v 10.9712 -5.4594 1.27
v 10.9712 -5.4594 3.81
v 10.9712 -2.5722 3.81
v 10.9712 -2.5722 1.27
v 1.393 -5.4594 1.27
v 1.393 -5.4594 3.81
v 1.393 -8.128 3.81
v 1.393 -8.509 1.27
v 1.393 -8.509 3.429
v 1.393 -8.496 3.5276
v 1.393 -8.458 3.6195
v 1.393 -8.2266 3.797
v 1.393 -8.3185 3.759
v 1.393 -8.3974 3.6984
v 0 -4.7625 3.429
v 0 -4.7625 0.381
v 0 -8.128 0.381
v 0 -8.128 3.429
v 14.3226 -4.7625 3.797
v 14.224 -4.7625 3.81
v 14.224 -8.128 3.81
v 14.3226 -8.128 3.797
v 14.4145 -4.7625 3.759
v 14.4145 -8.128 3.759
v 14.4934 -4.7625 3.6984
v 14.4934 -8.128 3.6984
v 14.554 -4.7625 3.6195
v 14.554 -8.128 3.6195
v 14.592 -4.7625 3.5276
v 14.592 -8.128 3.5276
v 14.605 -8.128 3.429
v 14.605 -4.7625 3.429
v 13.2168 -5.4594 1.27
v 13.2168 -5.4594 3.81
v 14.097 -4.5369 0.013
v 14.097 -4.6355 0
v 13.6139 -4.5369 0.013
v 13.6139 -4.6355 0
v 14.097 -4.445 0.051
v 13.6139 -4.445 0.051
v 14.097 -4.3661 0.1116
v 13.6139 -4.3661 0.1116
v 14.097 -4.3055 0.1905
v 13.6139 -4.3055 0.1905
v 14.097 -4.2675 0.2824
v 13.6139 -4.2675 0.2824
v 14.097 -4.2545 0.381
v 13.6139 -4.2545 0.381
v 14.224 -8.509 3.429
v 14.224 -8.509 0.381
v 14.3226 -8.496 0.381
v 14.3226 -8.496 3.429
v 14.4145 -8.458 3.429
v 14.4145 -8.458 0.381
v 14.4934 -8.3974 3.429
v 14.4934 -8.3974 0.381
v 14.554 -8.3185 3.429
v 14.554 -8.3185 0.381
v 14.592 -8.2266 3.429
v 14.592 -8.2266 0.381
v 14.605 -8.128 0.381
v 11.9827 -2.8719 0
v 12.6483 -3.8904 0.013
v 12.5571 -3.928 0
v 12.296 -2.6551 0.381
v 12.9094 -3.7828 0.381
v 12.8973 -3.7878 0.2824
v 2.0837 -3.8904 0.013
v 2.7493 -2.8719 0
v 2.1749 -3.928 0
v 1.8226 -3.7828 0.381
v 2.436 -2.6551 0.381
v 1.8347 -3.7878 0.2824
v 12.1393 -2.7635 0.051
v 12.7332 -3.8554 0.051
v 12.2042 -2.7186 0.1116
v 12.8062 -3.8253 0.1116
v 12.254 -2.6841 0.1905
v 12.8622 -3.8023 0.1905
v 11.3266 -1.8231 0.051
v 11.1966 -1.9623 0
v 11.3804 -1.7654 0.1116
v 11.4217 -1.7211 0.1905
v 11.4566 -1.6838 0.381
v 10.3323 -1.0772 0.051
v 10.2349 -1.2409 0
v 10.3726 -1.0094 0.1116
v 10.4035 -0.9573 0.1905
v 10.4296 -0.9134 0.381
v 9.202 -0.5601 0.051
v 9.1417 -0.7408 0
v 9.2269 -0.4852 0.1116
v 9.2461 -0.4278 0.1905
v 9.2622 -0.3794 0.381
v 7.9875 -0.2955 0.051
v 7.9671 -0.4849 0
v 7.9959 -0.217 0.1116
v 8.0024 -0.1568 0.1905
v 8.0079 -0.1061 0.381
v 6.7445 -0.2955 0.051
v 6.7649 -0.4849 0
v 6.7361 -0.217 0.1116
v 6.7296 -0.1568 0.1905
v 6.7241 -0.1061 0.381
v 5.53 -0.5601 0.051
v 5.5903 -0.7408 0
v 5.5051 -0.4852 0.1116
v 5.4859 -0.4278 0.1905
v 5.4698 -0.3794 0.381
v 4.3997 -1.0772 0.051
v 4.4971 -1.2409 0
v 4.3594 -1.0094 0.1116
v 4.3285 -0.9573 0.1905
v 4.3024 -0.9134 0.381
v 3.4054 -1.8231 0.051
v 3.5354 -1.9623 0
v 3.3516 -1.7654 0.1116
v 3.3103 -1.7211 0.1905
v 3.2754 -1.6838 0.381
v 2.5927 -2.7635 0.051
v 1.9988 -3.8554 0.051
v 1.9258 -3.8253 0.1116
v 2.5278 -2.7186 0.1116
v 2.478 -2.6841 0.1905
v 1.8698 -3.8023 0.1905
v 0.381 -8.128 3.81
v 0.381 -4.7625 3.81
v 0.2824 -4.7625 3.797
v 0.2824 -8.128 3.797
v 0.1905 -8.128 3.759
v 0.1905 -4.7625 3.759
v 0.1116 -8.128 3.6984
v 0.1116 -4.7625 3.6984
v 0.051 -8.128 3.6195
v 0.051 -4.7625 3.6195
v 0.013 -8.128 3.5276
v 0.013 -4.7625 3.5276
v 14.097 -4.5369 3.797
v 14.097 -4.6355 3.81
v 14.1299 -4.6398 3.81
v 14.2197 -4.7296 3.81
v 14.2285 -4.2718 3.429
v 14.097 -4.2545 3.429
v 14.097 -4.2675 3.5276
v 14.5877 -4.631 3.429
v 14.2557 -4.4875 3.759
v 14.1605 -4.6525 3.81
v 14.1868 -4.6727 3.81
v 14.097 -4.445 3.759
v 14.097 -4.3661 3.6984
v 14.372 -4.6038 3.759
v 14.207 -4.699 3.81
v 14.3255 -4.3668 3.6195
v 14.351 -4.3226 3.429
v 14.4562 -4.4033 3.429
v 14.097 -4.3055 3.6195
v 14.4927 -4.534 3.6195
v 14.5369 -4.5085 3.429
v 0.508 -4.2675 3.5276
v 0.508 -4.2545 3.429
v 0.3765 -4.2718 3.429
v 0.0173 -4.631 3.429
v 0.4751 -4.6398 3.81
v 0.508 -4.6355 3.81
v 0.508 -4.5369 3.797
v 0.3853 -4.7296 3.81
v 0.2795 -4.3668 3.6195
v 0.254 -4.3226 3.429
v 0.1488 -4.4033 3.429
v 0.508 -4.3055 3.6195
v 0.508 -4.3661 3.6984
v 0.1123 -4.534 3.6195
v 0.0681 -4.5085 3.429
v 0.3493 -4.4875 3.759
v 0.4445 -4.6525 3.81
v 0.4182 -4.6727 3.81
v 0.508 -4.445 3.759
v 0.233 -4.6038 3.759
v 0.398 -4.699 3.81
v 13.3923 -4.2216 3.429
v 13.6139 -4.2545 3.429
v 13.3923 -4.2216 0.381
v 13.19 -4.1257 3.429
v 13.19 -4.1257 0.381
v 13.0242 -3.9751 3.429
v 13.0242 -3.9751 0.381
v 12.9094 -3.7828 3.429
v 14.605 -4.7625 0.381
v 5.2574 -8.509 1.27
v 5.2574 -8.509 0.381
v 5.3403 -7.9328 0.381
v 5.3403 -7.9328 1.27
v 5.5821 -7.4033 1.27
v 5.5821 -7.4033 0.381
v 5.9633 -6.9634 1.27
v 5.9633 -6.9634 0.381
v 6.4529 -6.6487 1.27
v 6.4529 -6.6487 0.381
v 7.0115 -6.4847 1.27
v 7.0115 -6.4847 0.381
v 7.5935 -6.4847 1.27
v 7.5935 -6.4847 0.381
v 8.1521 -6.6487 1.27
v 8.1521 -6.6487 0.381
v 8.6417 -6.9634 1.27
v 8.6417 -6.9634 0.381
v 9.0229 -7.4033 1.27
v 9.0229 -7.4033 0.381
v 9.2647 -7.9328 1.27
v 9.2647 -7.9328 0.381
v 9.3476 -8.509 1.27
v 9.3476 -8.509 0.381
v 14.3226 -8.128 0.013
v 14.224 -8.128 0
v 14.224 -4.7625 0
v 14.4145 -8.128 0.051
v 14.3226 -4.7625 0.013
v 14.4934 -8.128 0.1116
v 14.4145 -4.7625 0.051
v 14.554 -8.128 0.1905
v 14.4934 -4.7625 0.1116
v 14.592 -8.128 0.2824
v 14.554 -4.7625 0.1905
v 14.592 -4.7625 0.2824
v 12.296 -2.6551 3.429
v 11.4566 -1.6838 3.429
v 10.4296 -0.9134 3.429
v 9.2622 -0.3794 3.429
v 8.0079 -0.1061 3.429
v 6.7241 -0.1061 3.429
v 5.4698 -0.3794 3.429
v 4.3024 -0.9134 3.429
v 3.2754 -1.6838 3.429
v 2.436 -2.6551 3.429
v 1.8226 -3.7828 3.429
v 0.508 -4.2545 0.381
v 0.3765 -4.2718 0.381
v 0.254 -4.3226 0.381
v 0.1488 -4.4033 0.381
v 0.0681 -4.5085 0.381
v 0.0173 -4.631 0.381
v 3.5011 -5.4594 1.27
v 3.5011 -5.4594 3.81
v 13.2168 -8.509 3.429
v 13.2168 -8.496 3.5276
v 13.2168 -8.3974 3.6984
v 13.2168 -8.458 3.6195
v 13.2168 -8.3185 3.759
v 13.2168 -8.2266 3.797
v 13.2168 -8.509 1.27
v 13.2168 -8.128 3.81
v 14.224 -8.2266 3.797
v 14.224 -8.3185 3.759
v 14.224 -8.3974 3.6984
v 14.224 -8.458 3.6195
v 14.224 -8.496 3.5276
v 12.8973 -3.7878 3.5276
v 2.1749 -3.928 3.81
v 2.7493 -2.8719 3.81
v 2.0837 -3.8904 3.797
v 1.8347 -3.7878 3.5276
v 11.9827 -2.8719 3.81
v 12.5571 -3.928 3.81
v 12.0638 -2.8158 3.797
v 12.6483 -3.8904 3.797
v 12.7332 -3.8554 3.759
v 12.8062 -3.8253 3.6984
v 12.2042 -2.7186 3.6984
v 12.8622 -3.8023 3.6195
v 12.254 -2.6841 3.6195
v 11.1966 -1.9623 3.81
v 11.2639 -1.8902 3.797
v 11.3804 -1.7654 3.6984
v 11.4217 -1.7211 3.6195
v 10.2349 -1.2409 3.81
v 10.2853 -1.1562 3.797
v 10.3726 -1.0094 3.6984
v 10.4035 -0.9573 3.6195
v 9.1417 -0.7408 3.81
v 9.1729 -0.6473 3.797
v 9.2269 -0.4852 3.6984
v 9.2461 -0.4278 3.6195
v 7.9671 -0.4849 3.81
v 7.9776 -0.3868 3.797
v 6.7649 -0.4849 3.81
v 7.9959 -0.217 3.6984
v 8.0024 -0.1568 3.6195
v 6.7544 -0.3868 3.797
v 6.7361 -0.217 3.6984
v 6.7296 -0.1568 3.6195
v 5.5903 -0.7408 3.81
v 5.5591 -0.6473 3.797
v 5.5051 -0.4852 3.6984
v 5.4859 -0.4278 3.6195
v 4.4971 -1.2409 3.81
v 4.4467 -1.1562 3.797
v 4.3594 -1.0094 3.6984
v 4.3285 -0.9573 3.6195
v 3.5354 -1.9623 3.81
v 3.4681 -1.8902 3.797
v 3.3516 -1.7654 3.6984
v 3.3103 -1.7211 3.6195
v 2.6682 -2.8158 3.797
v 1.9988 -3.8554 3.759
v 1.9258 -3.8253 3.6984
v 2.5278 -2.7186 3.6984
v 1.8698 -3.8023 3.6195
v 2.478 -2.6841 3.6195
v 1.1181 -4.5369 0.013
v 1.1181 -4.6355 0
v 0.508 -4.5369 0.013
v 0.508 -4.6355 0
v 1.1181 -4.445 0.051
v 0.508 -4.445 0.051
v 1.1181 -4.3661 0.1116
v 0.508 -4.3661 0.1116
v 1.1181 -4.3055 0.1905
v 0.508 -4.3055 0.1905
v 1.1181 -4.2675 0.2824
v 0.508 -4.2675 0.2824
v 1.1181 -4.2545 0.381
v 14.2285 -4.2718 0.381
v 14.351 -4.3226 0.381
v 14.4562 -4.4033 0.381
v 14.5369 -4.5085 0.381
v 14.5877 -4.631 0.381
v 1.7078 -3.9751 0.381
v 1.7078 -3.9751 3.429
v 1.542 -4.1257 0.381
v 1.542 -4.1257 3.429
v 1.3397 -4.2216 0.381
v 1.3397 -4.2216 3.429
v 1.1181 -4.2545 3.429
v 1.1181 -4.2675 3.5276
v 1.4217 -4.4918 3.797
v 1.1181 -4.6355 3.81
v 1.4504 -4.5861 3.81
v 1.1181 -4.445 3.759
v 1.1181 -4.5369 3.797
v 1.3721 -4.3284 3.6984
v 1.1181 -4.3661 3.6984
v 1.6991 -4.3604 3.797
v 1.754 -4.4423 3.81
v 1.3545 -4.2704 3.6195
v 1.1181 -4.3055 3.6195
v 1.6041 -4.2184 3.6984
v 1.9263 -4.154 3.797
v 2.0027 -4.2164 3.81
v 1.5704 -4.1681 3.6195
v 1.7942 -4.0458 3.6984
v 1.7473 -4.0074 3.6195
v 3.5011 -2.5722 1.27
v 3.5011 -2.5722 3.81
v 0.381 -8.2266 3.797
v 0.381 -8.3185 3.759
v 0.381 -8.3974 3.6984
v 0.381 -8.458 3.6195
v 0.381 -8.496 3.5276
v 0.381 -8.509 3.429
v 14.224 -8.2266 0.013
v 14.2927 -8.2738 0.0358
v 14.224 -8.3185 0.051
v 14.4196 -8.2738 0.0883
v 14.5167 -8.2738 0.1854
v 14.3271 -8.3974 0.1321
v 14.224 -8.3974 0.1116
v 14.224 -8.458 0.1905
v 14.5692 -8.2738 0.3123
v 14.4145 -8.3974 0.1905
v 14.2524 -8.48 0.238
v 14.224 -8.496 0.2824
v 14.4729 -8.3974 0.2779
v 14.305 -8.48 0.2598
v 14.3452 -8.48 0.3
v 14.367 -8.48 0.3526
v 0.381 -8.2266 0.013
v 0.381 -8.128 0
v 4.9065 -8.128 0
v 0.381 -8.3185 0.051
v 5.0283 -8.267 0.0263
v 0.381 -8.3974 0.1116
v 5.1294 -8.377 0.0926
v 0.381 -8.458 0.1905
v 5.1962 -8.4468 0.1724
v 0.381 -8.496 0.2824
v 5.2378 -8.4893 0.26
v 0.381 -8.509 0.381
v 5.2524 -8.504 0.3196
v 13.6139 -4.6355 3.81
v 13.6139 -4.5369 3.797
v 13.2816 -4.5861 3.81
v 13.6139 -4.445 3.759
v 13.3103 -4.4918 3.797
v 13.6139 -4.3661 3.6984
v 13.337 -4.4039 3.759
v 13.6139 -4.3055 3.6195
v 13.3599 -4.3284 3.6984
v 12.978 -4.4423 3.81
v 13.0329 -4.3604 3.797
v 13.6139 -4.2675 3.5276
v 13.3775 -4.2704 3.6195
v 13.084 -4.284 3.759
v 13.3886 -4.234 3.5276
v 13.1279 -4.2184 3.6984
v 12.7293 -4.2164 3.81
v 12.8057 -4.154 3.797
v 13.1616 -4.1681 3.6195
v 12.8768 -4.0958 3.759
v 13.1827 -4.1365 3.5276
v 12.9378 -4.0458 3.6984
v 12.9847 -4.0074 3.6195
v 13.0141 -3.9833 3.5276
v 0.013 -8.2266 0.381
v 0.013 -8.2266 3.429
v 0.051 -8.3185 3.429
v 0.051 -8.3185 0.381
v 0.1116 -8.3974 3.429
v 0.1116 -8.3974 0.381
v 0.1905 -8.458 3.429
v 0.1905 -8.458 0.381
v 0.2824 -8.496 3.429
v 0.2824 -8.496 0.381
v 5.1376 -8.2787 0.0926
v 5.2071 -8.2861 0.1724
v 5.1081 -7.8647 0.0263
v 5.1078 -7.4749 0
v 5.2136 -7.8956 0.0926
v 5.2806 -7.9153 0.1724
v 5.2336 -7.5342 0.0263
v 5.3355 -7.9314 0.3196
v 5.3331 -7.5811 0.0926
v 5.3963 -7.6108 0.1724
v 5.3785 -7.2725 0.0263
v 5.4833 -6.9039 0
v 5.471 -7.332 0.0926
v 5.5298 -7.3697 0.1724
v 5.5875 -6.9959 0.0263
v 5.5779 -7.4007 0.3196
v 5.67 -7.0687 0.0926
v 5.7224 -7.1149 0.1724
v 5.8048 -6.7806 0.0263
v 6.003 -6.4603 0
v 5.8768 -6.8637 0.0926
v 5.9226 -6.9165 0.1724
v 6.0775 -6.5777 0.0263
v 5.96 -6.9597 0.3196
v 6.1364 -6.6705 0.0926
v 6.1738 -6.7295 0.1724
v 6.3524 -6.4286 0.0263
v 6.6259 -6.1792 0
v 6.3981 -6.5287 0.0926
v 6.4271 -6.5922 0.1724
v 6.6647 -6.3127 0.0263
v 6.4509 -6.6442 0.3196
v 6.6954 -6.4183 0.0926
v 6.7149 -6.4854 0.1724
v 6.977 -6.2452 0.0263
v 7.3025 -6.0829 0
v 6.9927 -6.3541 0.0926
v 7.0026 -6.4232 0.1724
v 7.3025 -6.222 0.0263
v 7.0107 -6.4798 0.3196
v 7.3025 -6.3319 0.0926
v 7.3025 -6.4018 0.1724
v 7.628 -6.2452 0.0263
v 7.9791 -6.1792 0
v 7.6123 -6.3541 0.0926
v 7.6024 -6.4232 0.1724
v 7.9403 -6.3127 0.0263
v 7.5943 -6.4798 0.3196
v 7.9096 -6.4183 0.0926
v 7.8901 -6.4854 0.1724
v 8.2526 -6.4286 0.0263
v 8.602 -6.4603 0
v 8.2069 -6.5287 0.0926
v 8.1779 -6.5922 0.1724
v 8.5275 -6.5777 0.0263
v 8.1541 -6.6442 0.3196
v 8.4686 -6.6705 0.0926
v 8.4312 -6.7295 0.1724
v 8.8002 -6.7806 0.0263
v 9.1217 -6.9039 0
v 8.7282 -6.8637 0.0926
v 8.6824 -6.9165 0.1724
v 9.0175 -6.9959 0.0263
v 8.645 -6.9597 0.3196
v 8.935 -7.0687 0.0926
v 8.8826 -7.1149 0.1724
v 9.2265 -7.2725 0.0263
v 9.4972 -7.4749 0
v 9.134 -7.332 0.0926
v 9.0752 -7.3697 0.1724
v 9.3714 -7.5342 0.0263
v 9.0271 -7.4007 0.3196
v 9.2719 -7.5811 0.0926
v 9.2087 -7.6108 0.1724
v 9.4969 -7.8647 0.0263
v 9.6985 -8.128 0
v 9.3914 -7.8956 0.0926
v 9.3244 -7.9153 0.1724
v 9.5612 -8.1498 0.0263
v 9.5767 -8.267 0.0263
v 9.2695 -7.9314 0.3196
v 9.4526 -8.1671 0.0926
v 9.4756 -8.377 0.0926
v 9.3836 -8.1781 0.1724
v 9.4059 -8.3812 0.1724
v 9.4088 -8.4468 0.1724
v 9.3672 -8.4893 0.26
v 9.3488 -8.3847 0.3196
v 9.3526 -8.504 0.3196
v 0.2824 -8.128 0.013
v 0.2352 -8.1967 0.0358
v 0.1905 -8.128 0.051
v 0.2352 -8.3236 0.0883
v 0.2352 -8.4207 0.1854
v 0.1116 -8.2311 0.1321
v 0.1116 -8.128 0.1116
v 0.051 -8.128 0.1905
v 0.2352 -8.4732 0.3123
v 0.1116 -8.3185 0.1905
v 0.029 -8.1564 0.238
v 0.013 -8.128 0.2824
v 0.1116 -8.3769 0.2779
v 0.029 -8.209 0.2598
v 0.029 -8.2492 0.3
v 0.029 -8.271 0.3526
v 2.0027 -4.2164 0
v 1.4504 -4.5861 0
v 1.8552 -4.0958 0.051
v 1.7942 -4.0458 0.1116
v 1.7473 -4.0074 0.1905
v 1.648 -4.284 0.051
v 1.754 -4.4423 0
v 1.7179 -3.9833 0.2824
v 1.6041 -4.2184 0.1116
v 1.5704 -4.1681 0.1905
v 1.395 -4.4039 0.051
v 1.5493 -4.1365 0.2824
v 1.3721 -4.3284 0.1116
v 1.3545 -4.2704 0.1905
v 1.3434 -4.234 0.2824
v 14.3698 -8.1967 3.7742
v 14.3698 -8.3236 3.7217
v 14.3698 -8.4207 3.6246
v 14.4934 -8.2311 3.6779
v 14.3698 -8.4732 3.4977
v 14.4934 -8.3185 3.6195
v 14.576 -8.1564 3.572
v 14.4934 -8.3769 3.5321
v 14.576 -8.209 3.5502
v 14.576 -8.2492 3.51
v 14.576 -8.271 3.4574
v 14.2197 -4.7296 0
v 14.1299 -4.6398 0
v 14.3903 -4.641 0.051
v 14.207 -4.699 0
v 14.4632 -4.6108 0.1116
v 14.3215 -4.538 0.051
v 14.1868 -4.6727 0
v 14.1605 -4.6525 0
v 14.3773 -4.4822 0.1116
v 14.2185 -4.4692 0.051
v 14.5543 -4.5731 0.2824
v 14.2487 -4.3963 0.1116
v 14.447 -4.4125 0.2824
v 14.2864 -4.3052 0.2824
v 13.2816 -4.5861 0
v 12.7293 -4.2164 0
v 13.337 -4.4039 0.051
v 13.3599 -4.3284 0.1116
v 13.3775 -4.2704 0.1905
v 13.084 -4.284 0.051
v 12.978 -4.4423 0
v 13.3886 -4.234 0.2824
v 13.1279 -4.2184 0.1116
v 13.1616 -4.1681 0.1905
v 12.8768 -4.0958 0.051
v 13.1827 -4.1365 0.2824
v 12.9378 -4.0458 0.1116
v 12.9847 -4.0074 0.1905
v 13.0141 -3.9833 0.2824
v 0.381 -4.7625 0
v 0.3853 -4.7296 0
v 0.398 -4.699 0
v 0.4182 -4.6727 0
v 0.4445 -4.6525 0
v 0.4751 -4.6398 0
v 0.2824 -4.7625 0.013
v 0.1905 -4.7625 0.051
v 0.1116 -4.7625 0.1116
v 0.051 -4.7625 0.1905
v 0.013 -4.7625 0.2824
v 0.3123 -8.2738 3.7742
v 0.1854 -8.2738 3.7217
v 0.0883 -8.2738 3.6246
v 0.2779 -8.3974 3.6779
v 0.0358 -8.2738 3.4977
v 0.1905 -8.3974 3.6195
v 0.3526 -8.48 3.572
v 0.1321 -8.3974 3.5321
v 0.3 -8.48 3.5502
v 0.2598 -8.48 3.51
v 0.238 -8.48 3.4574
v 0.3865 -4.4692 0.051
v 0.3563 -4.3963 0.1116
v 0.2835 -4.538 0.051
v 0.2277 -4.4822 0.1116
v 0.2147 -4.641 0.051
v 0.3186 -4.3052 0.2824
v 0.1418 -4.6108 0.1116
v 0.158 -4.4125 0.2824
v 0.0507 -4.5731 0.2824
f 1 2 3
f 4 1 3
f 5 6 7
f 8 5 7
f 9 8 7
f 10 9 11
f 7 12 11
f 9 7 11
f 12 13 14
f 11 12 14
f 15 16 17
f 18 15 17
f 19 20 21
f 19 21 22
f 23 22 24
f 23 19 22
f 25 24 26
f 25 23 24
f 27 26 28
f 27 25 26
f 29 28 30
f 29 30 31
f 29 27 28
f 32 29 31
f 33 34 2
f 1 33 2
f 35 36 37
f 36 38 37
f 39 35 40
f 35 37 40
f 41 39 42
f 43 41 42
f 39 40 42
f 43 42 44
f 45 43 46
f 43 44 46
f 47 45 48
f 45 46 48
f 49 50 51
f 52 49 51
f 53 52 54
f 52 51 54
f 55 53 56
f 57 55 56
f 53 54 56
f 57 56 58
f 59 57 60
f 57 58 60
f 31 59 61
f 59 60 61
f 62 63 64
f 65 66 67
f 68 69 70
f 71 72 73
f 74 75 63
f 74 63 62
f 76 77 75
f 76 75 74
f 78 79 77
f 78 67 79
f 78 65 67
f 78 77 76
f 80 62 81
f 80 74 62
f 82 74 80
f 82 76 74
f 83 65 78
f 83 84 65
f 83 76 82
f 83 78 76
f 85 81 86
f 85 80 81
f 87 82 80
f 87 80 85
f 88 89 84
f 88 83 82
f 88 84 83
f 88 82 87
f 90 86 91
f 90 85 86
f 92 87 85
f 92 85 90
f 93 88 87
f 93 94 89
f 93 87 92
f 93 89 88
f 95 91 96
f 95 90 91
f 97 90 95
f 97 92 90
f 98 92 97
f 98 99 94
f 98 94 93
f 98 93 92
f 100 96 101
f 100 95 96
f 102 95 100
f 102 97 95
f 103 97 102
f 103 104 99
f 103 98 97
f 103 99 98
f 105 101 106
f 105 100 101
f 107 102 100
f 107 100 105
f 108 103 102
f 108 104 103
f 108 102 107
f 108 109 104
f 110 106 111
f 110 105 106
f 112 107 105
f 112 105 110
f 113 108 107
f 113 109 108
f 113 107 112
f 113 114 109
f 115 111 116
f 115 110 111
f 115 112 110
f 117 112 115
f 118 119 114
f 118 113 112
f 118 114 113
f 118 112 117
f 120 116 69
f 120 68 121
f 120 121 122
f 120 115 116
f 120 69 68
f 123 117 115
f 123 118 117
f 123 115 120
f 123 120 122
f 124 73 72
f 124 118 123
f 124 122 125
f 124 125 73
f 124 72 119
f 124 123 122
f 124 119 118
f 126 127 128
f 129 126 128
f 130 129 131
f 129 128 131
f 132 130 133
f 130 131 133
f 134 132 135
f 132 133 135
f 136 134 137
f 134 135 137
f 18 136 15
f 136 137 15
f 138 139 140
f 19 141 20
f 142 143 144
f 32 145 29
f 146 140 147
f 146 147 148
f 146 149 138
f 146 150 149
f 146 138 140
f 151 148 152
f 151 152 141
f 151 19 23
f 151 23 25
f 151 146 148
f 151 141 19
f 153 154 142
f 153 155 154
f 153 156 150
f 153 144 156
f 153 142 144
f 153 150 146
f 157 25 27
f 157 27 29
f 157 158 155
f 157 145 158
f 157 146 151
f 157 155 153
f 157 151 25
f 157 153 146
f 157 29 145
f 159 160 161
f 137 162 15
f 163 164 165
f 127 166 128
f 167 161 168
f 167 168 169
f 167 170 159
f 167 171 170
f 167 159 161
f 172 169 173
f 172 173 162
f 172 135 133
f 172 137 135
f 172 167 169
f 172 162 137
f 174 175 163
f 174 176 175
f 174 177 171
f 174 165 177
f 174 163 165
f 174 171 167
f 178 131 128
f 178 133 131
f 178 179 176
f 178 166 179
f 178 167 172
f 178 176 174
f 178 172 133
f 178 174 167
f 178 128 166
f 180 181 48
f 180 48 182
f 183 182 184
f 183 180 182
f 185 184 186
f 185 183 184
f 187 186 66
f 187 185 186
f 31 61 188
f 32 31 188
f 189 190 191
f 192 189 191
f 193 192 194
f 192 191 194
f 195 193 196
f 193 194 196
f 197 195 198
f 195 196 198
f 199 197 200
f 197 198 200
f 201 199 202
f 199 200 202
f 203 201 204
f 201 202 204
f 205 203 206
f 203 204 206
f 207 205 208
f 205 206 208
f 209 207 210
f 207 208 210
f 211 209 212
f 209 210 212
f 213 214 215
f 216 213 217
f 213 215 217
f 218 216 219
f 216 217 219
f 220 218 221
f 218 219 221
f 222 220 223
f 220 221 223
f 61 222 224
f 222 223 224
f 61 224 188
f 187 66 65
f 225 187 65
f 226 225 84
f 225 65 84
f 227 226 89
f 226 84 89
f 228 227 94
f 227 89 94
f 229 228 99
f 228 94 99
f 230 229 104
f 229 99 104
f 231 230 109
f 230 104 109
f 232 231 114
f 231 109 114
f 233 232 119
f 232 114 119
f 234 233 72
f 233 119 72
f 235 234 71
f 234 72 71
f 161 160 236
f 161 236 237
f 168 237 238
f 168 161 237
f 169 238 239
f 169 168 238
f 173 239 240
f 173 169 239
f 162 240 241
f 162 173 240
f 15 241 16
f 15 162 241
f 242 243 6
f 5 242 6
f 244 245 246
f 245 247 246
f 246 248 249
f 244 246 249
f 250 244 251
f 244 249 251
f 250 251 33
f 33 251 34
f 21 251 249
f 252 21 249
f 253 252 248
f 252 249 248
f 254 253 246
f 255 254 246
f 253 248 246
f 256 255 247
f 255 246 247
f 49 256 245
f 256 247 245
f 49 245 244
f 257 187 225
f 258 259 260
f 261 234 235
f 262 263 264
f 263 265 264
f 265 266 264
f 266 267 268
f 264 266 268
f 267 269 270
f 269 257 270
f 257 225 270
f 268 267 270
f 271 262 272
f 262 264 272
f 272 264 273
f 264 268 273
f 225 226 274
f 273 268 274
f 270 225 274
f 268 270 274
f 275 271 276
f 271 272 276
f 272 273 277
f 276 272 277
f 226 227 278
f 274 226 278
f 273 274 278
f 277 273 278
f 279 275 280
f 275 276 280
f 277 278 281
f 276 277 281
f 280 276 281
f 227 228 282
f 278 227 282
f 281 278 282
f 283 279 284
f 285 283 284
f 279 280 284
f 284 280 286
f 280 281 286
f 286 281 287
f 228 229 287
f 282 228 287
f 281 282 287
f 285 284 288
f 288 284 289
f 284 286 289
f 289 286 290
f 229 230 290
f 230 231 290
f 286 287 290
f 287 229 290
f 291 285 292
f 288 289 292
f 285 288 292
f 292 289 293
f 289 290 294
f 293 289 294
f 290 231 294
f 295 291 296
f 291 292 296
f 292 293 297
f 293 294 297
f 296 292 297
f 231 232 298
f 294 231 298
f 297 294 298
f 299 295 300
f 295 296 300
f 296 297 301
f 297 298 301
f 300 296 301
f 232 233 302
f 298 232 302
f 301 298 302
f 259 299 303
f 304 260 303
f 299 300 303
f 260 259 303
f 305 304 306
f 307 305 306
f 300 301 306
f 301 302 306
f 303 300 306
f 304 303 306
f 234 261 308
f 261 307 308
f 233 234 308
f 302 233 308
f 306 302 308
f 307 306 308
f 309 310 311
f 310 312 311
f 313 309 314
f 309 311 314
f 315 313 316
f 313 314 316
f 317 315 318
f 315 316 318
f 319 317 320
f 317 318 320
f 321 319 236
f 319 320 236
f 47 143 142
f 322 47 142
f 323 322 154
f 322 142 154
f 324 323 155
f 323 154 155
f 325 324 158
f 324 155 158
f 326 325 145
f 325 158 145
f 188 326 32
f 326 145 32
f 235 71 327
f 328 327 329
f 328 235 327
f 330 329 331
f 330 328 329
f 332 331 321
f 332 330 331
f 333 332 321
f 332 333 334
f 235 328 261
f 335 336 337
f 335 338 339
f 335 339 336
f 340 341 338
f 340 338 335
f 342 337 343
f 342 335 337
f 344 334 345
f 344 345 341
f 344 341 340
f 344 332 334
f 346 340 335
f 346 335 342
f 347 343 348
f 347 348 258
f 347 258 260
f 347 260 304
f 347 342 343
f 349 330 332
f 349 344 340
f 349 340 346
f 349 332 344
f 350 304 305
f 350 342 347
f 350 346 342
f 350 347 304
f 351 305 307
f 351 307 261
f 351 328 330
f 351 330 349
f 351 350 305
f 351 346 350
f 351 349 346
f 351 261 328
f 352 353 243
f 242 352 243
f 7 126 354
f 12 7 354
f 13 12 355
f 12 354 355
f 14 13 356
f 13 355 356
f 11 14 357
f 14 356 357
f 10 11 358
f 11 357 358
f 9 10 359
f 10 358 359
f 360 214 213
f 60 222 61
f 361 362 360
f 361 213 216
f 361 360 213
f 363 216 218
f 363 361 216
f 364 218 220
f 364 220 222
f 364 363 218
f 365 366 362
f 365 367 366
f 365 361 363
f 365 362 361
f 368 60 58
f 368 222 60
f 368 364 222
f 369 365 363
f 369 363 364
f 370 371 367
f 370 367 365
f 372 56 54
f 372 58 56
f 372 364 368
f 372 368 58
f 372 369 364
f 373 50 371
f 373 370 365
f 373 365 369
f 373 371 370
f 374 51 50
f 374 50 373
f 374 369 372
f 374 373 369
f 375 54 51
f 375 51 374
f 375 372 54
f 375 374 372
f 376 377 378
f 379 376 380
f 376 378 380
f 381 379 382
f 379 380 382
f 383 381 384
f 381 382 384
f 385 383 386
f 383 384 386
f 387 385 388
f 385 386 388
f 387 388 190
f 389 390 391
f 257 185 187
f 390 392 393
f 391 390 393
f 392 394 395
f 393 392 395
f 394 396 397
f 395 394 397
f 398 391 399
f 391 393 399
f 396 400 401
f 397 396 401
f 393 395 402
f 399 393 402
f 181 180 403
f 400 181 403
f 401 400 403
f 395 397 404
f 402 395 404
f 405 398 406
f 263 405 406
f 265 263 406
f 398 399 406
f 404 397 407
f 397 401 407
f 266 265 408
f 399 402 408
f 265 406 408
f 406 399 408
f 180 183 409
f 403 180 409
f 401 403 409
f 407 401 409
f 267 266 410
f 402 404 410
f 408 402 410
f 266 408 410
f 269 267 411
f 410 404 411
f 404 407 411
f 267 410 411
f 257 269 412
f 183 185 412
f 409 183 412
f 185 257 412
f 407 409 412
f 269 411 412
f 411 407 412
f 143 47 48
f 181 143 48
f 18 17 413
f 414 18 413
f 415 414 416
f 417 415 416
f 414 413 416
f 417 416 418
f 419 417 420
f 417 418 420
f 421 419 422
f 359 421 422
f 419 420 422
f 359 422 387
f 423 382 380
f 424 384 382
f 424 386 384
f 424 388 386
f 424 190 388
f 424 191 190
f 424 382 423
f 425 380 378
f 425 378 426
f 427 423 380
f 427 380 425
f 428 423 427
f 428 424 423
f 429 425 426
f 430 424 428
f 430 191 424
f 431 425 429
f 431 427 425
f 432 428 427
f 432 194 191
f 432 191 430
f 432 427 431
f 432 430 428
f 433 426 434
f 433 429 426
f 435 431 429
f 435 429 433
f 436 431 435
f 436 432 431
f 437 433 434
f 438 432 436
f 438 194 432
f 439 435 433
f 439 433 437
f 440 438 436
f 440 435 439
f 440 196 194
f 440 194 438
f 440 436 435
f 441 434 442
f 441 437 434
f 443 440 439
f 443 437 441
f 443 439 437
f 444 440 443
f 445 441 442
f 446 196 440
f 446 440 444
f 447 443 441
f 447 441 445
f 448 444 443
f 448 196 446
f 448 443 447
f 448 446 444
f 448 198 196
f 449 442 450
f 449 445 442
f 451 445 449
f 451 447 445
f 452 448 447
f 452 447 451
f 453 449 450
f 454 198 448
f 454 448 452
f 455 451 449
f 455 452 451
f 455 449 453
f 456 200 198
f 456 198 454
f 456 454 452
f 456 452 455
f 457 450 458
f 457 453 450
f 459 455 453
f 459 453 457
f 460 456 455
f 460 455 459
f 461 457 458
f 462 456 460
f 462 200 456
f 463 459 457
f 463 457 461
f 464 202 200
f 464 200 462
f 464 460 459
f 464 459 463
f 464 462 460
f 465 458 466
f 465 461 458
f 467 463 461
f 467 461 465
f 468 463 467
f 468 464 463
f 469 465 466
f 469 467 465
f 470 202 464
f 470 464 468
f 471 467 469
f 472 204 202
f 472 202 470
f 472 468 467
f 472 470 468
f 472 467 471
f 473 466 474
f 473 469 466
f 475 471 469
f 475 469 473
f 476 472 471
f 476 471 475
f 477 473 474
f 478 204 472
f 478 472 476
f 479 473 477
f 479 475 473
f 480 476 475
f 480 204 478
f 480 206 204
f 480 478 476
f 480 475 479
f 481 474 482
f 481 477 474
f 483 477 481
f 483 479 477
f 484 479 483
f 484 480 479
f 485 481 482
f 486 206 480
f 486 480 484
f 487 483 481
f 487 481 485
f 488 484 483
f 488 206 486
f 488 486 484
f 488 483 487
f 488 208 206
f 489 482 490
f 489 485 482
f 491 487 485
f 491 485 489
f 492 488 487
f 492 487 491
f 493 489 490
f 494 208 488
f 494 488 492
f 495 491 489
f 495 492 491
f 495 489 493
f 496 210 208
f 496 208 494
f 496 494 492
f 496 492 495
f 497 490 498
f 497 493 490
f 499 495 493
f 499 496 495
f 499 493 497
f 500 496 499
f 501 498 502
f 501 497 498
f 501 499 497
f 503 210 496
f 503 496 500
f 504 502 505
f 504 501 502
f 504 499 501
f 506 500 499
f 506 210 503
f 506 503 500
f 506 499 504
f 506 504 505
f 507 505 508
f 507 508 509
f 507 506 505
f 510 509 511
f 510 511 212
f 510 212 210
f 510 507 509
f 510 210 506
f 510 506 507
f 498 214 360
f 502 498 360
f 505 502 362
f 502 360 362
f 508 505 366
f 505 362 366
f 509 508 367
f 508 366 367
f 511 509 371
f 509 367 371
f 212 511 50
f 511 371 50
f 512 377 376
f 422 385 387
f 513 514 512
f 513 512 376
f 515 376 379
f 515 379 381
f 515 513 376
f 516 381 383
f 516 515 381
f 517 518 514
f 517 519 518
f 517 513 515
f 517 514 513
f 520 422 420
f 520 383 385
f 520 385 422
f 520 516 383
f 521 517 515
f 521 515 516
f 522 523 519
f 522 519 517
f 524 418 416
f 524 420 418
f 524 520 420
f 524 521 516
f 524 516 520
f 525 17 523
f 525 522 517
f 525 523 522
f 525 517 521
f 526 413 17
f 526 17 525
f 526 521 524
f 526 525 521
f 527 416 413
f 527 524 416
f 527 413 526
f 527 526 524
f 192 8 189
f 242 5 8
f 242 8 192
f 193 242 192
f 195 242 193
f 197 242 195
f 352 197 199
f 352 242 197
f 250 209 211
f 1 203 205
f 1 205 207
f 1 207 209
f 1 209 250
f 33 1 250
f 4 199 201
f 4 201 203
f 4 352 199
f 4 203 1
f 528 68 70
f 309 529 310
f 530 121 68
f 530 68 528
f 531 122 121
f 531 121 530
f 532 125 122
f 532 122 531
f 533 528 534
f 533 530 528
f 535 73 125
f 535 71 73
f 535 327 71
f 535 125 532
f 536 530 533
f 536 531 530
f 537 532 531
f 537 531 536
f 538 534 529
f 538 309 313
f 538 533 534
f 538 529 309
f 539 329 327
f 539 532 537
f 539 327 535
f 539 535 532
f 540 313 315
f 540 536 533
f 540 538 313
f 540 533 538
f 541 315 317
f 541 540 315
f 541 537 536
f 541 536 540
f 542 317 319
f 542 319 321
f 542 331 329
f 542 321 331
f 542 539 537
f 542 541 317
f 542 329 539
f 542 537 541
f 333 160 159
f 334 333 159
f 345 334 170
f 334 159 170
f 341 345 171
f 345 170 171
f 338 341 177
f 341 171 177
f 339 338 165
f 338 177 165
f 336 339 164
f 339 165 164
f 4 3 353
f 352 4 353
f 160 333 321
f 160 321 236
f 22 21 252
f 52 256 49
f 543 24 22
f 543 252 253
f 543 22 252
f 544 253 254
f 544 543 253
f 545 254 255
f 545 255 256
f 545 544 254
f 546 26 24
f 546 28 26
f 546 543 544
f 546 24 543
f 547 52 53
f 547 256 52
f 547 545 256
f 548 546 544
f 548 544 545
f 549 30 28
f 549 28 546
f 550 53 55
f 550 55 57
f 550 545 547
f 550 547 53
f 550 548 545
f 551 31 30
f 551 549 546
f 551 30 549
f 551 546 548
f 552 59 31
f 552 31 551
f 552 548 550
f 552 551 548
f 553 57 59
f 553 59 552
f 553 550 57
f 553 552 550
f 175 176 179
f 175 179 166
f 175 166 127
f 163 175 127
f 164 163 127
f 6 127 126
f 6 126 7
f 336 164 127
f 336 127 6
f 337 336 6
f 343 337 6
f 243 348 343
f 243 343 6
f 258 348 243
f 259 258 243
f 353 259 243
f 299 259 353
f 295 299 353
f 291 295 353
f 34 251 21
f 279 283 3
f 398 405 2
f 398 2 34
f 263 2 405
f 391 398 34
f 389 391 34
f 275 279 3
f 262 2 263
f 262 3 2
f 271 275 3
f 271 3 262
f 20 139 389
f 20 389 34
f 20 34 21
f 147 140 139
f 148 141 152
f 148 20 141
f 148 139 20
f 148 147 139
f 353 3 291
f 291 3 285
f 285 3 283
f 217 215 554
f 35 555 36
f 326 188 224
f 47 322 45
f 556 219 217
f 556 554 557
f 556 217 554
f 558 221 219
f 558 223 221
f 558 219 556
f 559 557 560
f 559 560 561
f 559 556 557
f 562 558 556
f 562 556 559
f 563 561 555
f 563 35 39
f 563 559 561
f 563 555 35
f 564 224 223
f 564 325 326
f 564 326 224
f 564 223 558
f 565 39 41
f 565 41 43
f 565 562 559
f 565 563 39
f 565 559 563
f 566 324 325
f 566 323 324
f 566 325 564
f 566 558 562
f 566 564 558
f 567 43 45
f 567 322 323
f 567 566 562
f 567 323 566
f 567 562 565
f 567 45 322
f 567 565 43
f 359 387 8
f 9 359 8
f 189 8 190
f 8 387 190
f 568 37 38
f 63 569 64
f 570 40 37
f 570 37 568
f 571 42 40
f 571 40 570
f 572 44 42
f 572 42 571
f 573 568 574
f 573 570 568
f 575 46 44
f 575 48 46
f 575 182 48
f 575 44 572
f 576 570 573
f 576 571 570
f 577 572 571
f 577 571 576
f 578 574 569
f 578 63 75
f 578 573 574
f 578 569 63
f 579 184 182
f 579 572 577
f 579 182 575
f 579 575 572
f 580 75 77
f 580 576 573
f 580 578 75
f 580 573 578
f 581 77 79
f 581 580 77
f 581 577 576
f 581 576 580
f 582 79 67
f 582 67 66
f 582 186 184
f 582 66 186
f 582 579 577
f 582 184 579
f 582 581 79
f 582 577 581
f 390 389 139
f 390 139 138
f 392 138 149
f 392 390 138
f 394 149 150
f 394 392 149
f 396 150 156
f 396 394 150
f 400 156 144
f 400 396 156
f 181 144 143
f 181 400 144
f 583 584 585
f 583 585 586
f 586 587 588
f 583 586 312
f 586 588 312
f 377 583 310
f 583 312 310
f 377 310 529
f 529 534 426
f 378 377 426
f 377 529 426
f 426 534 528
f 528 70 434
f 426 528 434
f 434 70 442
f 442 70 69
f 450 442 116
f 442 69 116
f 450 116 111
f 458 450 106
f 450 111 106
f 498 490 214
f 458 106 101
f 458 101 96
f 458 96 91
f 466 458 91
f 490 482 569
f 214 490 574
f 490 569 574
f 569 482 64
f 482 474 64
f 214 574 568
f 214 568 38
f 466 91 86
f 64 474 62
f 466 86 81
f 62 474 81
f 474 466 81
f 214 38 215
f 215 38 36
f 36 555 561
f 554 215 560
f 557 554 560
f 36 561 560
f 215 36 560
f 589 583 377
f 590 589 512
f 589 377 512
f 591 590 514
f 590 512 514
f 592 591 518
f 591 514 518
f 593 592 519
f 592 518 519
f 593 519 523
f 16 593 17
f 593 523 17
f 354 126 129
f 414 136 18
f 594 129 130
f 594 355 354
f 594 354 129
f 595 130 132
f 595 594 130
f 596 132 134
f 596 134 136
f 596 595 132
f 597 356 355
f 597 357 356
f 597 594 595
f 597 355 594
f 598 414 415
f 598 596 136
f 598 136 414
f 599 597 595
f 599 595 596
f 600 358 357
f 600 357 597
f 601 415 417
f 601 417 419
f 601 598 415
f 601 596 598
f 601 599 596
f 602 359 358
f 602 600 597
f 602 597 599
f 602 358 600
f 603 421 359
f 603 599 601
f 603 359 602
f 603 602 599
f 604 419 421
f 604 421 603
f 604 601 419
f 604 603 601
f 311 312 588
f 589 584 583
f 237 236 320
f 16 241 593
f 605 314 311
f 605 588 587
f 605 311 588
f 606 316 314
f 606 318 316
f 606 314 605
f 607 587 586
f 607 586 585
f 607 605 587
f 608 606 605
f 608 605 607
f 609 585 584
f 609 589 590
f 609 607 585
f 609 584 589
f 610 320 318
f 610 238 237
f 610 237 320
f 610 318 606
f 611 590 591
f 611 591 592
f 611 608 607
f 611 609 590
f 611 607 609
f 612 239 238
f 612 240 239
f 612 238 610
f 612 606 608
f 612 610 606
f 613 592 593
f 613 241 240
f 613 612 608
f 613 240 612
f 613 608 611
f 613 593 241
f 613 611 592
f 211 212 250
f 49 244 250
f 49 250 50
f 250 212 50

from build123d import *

# Parameters (mm, degrees)
F1_DEPTH     = 3.81
F2_R         = 0.762
F3_R         = 0.508
F4_R         = 0.381
F5_T1_DEPTH  = 0.6101247647
F5_T3_DEPTH  = 3.3655
F5_T5_DEPTH  = 5.8289214894
F5_T7_DEPTH  = 0.4831247647
F5_T9_DEPTH  = 5.8289214894
F5_T11_DEPTH = 3.048
F5_S15_W     = 0.381
F5_S15_H     = 0.381
F5_T16_DEPTH = 0.381
F5_S21_W     = 0.381
F5_S21_H     = 0.381
F5_T22_DEPTH = 0.381
F5_S27_W     = 0.381
F5_S27_H     = 0.381
F5_T28_DEPTH = 0.381
F5_S33_W     = 0.381
F5_S33_H     = 0.381
F5_T34_DEPTH = 0.381
F5_T38_ANGLE = 90
F5_T40_ANGLE = 67.60378922
F5_T42_ANGLE = 135.20757844
F5_T44_ANGLE = 67.60378922
F5_T46_ANGLE = 233.4571121673
F5_T48_ANGLE = 90
F7_DEPTH     = 2.54


# Not quite as in the source:
# - a fillet or chamfer that OpenCascade refuses, or shapes differently, is made with other operations: its cross-section is extruded or revolved along the edge and cut away or added


with BuildPart() as f1:
    # F0 (on Top) → F1 (new body)
    with BuildSketch(Plane.XY):
        with BuildLine():
            Line((0, -4.2545), (0, -8.509))
            Line((0, -8.509), (5.2574214894, -8.509))
            ThreePointArc((5.2574214894, -8.509), (7.3025, -6.4639214894), (9.3475785106, -8.509))
            Line((9.3475785106, -8.509), (14.605, -8.509))
            Line((14.605, -8.509), (14.605, -4.2545))
            Line((14.605, -4.2545), (13.081, -4.2545))
            ThreePointArc((13.081, -4.2545), (7.366, -0.0716128896), (1.651, -4.2545))
            Line((1.651, -4.2545), (0, -4.2545))
        make_face()
    extrude(amount=F1_DEPTH)

    # F2
    f2_edges = [f1.edges().sort_by_distance(p)[0] for p in [
        (13.081, -4.2545, 1.905),
        (1.651, -4.2545, 1.905),
    ]]
    fillet(f2_edges, radius=F2_R)

    # F3
    f3_edges = [f1.edges().sort_by_distance(p)[0] for p in [
        (0, -4.2545, 1.905),
        (14.605, -4.2545, 1.905),
    ]]
    fillet(f3_edges, radius=F3_R)

    # F4
    f4_edges = [f1.edges().sort_by_distance(p)[0] for p in [
        (0.813062, -4.2545, 0),
        (0.14879, -4.40329, 0),
        (1.542043, -4.125696, 0),
        (0, -6.63575, 0),
        (7.366, -0.071613, 0),
        (2.628711, -8.509, 0),
        (13.189957, -4.125696, 0),
        (7.3025, -6.463921, 0),
        (13.855438, -4.2545, 0),
        (11.976289, -8.509, 0),
        (14.45621, -4.40329, 0),
        (14.605, -6.63575, 0),
    ]]
    fillet(f4_edges, radius=F4_R)

    # F5: fillet of radius 0.381 on 14 edges, made by hand

    # F5_s2 → F5_t1 (cut)
    with BuildSketch(Plane.YZ.offset(0.508)):
        with BuildLine():
            ThreePointArc((-4.2545, 3.429), (-4.3660923164, 3.6984076836), (-4.6355, 3.81))
            Line((-4.6355, 3.81), (-4.2545, 3.81))
            Line((-4.2545, 3.81), (-4.2545, 3.429))
        make_face()
    extrude(amount=F5_T1_DEPTH, mode=Mode.SUBTRACT)

    # F5_s4 → F5_t3 (cut)
    with BuildSketch(Plane.XZ.offset(4.7625)):
        with BuildLine():
            ThreePointArc((0.381, 3.81), (0.1115923164, 3.6984076836), (0, 3.429))
            Line((0, 3.429), (0, 3.81))
            Line((0, 3.81), (0.381, 3.81))
        make_face()
        with BuildLine():
            ThreePointArc((14.224, 3.81), (14.4934076836, 3.6984076836), (14.605, 3.429))
            Line((14.605, 3.429), (14.605, 3.81))
            Line((14.605, 3.81), (14.224, 3.81))
        make_face()
    extrude(amount=F5_T3_DEPTH, mode=Mode.SUBTRACT)

    # F5_s6 → F5_t5 (cut)
    with BuildSketch(Plane.YZ.offset(0.381)):
        with BuildLine():
            ThreePointArc((-8.128, 3.81), (-8.3974076836, 3.6984076836), (-8.509, 3.429))
            Line((-8.509, 3.429), (-8.509, 3.81))
            Line((-8.509, 3.81), (-8.128, 3.81))
        make_face()
    extrude(amount=F5_T5_DEPTH, mode=Mode.SUBTRACT)

    # F5_s8 → F5_t7 (cut)
    with BuildSketch(Plane.YZ.offset(13.6138752353)):
        with BuildLine():
            ThreePointArc((-4.6355, 3.81), (-4.3660923164, 3.6984076836), (-4.2545, 3.429))
            Line((-4.2545, 3.429), (-4.2545, 3.81))
            Line((-4.2545, 3.81), (-4.6355, 3.81))
        make_face()
    extrude(amount=F5_T7_DEPTH, mode=Mode.SUBTRACT)

    # F5_s10 → F5_t9 (cut)
    with BuildSketch(Plane.YZ.offset(8.3950785106)):
        with BuildLine():
            ThreePointArc((-8.128, 3.81), (-8.3974076836, 3.6984076836), (-8.509, 3.429))
            Line((-8.509, 3.429), (-8.509, 3.81))
            Line((-8.509, 3.81), (-8.128, 3.81))
        make_face()
    extrude(amount=F5_T9_DEPTH, mode=Mode.SUBTRACT)

    # F5_s12 → F5_t11 (cut)
    with BuildSketch(Plane.XY.offset(0.381)):
        with BuildLine():
            ThreePointArc((0, -8.128), (0.1115923164, -8.3974076836), (0.381, -8.509))
            Line((0.381, -8.509), (0, -8.509))
            Line((0, -8.509), (0, -8.128))
        make_face()
        with BuildLine():
            ThreePointArc((14.224, -8.509), (14.4934076836, -8.3974076836), (14.605, -8.128))
            Line((14.605, -8.128), (14.605, -8.509))
            Line((14.605, -8.509), (14.224, -8.509))
        make_face()
    extrude(amount=F5_T11_DEPTH, mode=Mode.SUBTRACT)


with BuildPart() as f5_tool14:
    # F5_s15 → F5_t16 (new body)
    with BuildSketch(Plane.XZ.offset(8.128)):
        with Locations((14.4145, 0.1905)):
            Rectangle(F5_S15_W, F5_S15_H)
    extrude(amount=F5_T16_DEPTH)

    # F5_s17 → F5_t18 (revolve, cut)
    with BuildSketch(Plane(origin=(14.224, -8.128, 0.381), x_dir=(-0.7071067812, 0, 0.7071067812), z_dir=(0.7071067812, 0, 0.7071067812))):
        with BuildLine():
            ThreePointArc((0, -0.381), (0.381, 0), (0, 0.381))
            Line((0, 0.381), (0, -0.381))
        make_face()
    revolve(axis=Axis((14.224, -8.128, 0.381), (0, -1, 0)), mode=Mode.SUBTRACT)


with BuildPart() as f1_1:
    add(f1.part)

    # F5_t13: cut F5_tool14
    add(f5_tool14.part, mode=Mode.SUBTRACT)


with BuildPart() as f5_tool20:
    # F5_s21 → F5_t22 (new body)
    with BuildSketch(Plane.YZ.offset(0.381)):
        with Locations((-8.3185, 0.1905)):
            Rectangle(F5_S21_W, F5_S21_H)
    extrude(amount=-F5_T22_DEPTH)

    # F5_s23 → F5_t24 (revolve, cut)
    with BuildSketch(Plane(origin=(0.381, -8.128, 0.381), x_dir=(0, 0.7071067812, 0.7071067812), z_dir=(0, -0.7071067812, 0.7071067812))):
        with BuildLine():
            ThreePointArc((0, -0.381), (0.381, 0), (0, 0.381))
            Line((0, 0.381), (0, -0.381))
        make_face()
    revolve(axis=Axis((0.381, -8.128, 0.381), (-1, 0, 0)), mode=Mode.SUBTRACT)


with BuildPart() as f1_2:
    add(f1_1.part)

    # F5_t19: cut F5_tool20
    add(f5_tool20.part, mode=Mode.SUBTRACT)


with BuildPart() as f5_tool26:
    # F5_s27 → F5_t28 (new body)
    with BuildSketch(Plane.XZ.offset(8.128)):
        with Locations((0.1905, 3.6195)):
            Rectangle(F5_S27_W, F5_S27_H)
    extrude(amount=F5_T28_DEPTH)

    # F5_s29 → F5_t30 (revolve, cut)
    with BuildSketch(Plane(origin=(0.381, -8.128, 3.429), x_dir=(0.7071067812, 0, -0.7071067812), z_dir=(-0.7071067812, 0, -0.7071067812))):
        with BuildLine():
            ThreePointArc((0, -0.381), (0.381, 0), (0, 0.381))
            Line((0, 0.381), (0, -0.381))
        make_face()
    revolve(axis=Axis((0.381, -8.128, 3.429), (0, -1, 0)), mode=Mode.SUBTRACT)


with BuildPart() as f1_3:
    add(f1_2.part)

    # F5_t25: cut F5_tool26
    add(f5_tool26.part, mode=Mode.SUBTRACT)


with BuildPart() as f5_tool32:
    # F5_s33 → F5_t34 (new body)
    with BuildSketch(Plane.YZ.offset(14.224)):
        with Locations((-8.3185, 3.6195)):
            Rectangle(F5_S33_W, F5_S33_H)
    extrude(amount=F5_T34_DEPTH)

    # F5_s35 → F5_t36 (revolve, cut)
    with BuildSketch(Plane(origin=(14.224, -8.128, 3.429), x_dir=(0, 0.7071067812, -0.7071067812), z_dir=(0, -0.7071067812, -0.7071067812))):
        with BuildLine():
            ThreePointArc((0, -0.381), (0.381, 0), (0, 0.381))
            Line((0, 0.381), (0, -0.381))
        make_face()
    revolve(axis=Axis((14.224, -8.128, 3.429), (1, 0, 0)), mode=Mode.SUBTRACT)


with BuildPart() as f1_4:
    add(f1_3.part)

    # F5_t31: cut F5_tool32
    add(f5_tool32.part, mode=Mode.SUBTRACT)

    # F5_s37 → F5_t38 (revolve, cut)
    with BuildSketch(Plane.YZ.offset(0.508)):
        with BuildLine():
            ThreePointArc((-4.2545, 3.429), (-4.3660923164, 3.6984076836), (-4.6355, 3.81))
            Line((-4.6355, 3.81), (-4.2545, 3.81))
            Line((-4.2545, 3.81), (-4.2545, 3.429))
        make_face()
    revolve(axis=Axis((0.508, -4.7625, 3.81), (0, 0, 1)), revolution_arc=F5_T38_ANGLE, mode=Mode.SUBTRACT)

    # F5_s39 → F5_t40 (revolve, cut)
    with BuildSketch(Plane.YZ.offset(1.1181247647)):
        with BuildLine():
            ThreePointArc((-4.6355, 3.81), (-4.3660923164, 3.6984076836), (-4.2545, 3.429))
            Line((-4.2545, 3.429), (-4.2545, 3.81))
            Line((-4.2545, 3.81), (-4.6355, 3.81))
        make_face()
    revolve(axis=Axis((1.1181247647, -3.4925, 3.81), (0, 0, 1)), revolution_arc=F5_T40_ANGLE, mode=Mode.SUBTRACT)

    # F5_s41 → F5_t42 (revolve, cut)
    with BuildSketch(Plane(origin=(3.2066030929, -7.7812628503, 0), x_dir=(0, 0, 1), z_dir=(0.3810092313, -0.9245712334, 0))):
        with BuildLine():
            ThreePointArc((3.81, -10.113322678), (3.6984076836, -10.3827303617), (3.429, -10.494322678))
            Line((3.429, -10.494322678), (3.81, -10.494322678))
            Line((3.81, -10.494322678), (3.81, -10.113322678))
        make_face()
    revolve(axis=Axis((7.366, -6.0672049597, 3.81), (0, 0, 1)), revolution_arc=F5_T42_ANGLE, mode=Mode.SUBTRACT)

    # F5_s43 → F5_t44 (revolve, cut)
    with BuildSketch(Plane.YZ.offset(13.6138752353)):
        with BuildLine():
            ThreePointArc((-4.6355, 3.81), (-4.3660923164, 3.6984076836), (-4.2545, 3.429))
            Line((-4.2545, 3.429), (-4.2545, 3.81))
            Line((-4.2545, 3.81), (-4.6355, 3.81))
        make_face()
    revolve(axis=Axis((13.6138752353, -3.4925, 3.81), (0, 0, -1)), revolution_arc=F5_T44_ANGLE, mode=Mode.SUBTRACT)

    # F5_s45 → F5_t46 (revolve, cut)
    with BuildSketch(Plane(origin=(4.8953206605, -9.721188669, 0), x_dir=(0, 0, 1), z_dir=(0.449764197, -0.8931473378, 0))):
        with BuildLine():
            ThreePointArc((3.81, -0.2690863714), (3.6984076836, -0.5384940551), (3.429, -0.6500863714))
            Line((3.429, -0.6500863714), (3.81, -0.6500863714))
            Line((3.81, -0.6500863714), (3.81, -0.2690863714))
        make_face()
    revolve(axis=Axis((7.3025, -8.509, 3.81), (0, 0, -1)), revolution_arc=F5_T46_ANGLE, mode=Mode.SUBTRACT)

    # F5_s47 → F5_t48 (revolve, cut)
    with BuildSketch(Plane.YZ.offset(14.097)):
        with BuildLine():
            ThreePointArc((-4.6355, 3.81), (-4.3660923164, 3.6984076836), (-4.2545, 3.429))
            Line((-4.2545, 3.429), (-4.2545, 3.81))
            Line((-4.2545, 3.81), (-4.6355, 3.81))
        make_face()
    revolve(axis=Axis((14.097, -4.7625, 3.81), (0, 0, -1)), revolution_arc=F5_T48_ANGLE, mode=Mode.SUBTRACT)

    # F6 (on face) → F7 (cut)
    with BuildSketch(Plane.XY.offset(3.81)):
        Polygon((1.3930101413, -5.4594320245), (1.3930101413, -8.8049108163), (1.3930101413, -9.2631950974), (13.2167544216, -9.2631950974), (13.2167544216, -5.4594320245), (10.9711596742, -5.4594320245), (10.9711596742, -2.5722389109), (3.5011197906, -2.5722389109), (3.5011197906, -5.4594320245), align=None)
    extrude(amount=-F7_DEPTH, mode=Mode.SUBTRACT)


solid = f1_4.part
